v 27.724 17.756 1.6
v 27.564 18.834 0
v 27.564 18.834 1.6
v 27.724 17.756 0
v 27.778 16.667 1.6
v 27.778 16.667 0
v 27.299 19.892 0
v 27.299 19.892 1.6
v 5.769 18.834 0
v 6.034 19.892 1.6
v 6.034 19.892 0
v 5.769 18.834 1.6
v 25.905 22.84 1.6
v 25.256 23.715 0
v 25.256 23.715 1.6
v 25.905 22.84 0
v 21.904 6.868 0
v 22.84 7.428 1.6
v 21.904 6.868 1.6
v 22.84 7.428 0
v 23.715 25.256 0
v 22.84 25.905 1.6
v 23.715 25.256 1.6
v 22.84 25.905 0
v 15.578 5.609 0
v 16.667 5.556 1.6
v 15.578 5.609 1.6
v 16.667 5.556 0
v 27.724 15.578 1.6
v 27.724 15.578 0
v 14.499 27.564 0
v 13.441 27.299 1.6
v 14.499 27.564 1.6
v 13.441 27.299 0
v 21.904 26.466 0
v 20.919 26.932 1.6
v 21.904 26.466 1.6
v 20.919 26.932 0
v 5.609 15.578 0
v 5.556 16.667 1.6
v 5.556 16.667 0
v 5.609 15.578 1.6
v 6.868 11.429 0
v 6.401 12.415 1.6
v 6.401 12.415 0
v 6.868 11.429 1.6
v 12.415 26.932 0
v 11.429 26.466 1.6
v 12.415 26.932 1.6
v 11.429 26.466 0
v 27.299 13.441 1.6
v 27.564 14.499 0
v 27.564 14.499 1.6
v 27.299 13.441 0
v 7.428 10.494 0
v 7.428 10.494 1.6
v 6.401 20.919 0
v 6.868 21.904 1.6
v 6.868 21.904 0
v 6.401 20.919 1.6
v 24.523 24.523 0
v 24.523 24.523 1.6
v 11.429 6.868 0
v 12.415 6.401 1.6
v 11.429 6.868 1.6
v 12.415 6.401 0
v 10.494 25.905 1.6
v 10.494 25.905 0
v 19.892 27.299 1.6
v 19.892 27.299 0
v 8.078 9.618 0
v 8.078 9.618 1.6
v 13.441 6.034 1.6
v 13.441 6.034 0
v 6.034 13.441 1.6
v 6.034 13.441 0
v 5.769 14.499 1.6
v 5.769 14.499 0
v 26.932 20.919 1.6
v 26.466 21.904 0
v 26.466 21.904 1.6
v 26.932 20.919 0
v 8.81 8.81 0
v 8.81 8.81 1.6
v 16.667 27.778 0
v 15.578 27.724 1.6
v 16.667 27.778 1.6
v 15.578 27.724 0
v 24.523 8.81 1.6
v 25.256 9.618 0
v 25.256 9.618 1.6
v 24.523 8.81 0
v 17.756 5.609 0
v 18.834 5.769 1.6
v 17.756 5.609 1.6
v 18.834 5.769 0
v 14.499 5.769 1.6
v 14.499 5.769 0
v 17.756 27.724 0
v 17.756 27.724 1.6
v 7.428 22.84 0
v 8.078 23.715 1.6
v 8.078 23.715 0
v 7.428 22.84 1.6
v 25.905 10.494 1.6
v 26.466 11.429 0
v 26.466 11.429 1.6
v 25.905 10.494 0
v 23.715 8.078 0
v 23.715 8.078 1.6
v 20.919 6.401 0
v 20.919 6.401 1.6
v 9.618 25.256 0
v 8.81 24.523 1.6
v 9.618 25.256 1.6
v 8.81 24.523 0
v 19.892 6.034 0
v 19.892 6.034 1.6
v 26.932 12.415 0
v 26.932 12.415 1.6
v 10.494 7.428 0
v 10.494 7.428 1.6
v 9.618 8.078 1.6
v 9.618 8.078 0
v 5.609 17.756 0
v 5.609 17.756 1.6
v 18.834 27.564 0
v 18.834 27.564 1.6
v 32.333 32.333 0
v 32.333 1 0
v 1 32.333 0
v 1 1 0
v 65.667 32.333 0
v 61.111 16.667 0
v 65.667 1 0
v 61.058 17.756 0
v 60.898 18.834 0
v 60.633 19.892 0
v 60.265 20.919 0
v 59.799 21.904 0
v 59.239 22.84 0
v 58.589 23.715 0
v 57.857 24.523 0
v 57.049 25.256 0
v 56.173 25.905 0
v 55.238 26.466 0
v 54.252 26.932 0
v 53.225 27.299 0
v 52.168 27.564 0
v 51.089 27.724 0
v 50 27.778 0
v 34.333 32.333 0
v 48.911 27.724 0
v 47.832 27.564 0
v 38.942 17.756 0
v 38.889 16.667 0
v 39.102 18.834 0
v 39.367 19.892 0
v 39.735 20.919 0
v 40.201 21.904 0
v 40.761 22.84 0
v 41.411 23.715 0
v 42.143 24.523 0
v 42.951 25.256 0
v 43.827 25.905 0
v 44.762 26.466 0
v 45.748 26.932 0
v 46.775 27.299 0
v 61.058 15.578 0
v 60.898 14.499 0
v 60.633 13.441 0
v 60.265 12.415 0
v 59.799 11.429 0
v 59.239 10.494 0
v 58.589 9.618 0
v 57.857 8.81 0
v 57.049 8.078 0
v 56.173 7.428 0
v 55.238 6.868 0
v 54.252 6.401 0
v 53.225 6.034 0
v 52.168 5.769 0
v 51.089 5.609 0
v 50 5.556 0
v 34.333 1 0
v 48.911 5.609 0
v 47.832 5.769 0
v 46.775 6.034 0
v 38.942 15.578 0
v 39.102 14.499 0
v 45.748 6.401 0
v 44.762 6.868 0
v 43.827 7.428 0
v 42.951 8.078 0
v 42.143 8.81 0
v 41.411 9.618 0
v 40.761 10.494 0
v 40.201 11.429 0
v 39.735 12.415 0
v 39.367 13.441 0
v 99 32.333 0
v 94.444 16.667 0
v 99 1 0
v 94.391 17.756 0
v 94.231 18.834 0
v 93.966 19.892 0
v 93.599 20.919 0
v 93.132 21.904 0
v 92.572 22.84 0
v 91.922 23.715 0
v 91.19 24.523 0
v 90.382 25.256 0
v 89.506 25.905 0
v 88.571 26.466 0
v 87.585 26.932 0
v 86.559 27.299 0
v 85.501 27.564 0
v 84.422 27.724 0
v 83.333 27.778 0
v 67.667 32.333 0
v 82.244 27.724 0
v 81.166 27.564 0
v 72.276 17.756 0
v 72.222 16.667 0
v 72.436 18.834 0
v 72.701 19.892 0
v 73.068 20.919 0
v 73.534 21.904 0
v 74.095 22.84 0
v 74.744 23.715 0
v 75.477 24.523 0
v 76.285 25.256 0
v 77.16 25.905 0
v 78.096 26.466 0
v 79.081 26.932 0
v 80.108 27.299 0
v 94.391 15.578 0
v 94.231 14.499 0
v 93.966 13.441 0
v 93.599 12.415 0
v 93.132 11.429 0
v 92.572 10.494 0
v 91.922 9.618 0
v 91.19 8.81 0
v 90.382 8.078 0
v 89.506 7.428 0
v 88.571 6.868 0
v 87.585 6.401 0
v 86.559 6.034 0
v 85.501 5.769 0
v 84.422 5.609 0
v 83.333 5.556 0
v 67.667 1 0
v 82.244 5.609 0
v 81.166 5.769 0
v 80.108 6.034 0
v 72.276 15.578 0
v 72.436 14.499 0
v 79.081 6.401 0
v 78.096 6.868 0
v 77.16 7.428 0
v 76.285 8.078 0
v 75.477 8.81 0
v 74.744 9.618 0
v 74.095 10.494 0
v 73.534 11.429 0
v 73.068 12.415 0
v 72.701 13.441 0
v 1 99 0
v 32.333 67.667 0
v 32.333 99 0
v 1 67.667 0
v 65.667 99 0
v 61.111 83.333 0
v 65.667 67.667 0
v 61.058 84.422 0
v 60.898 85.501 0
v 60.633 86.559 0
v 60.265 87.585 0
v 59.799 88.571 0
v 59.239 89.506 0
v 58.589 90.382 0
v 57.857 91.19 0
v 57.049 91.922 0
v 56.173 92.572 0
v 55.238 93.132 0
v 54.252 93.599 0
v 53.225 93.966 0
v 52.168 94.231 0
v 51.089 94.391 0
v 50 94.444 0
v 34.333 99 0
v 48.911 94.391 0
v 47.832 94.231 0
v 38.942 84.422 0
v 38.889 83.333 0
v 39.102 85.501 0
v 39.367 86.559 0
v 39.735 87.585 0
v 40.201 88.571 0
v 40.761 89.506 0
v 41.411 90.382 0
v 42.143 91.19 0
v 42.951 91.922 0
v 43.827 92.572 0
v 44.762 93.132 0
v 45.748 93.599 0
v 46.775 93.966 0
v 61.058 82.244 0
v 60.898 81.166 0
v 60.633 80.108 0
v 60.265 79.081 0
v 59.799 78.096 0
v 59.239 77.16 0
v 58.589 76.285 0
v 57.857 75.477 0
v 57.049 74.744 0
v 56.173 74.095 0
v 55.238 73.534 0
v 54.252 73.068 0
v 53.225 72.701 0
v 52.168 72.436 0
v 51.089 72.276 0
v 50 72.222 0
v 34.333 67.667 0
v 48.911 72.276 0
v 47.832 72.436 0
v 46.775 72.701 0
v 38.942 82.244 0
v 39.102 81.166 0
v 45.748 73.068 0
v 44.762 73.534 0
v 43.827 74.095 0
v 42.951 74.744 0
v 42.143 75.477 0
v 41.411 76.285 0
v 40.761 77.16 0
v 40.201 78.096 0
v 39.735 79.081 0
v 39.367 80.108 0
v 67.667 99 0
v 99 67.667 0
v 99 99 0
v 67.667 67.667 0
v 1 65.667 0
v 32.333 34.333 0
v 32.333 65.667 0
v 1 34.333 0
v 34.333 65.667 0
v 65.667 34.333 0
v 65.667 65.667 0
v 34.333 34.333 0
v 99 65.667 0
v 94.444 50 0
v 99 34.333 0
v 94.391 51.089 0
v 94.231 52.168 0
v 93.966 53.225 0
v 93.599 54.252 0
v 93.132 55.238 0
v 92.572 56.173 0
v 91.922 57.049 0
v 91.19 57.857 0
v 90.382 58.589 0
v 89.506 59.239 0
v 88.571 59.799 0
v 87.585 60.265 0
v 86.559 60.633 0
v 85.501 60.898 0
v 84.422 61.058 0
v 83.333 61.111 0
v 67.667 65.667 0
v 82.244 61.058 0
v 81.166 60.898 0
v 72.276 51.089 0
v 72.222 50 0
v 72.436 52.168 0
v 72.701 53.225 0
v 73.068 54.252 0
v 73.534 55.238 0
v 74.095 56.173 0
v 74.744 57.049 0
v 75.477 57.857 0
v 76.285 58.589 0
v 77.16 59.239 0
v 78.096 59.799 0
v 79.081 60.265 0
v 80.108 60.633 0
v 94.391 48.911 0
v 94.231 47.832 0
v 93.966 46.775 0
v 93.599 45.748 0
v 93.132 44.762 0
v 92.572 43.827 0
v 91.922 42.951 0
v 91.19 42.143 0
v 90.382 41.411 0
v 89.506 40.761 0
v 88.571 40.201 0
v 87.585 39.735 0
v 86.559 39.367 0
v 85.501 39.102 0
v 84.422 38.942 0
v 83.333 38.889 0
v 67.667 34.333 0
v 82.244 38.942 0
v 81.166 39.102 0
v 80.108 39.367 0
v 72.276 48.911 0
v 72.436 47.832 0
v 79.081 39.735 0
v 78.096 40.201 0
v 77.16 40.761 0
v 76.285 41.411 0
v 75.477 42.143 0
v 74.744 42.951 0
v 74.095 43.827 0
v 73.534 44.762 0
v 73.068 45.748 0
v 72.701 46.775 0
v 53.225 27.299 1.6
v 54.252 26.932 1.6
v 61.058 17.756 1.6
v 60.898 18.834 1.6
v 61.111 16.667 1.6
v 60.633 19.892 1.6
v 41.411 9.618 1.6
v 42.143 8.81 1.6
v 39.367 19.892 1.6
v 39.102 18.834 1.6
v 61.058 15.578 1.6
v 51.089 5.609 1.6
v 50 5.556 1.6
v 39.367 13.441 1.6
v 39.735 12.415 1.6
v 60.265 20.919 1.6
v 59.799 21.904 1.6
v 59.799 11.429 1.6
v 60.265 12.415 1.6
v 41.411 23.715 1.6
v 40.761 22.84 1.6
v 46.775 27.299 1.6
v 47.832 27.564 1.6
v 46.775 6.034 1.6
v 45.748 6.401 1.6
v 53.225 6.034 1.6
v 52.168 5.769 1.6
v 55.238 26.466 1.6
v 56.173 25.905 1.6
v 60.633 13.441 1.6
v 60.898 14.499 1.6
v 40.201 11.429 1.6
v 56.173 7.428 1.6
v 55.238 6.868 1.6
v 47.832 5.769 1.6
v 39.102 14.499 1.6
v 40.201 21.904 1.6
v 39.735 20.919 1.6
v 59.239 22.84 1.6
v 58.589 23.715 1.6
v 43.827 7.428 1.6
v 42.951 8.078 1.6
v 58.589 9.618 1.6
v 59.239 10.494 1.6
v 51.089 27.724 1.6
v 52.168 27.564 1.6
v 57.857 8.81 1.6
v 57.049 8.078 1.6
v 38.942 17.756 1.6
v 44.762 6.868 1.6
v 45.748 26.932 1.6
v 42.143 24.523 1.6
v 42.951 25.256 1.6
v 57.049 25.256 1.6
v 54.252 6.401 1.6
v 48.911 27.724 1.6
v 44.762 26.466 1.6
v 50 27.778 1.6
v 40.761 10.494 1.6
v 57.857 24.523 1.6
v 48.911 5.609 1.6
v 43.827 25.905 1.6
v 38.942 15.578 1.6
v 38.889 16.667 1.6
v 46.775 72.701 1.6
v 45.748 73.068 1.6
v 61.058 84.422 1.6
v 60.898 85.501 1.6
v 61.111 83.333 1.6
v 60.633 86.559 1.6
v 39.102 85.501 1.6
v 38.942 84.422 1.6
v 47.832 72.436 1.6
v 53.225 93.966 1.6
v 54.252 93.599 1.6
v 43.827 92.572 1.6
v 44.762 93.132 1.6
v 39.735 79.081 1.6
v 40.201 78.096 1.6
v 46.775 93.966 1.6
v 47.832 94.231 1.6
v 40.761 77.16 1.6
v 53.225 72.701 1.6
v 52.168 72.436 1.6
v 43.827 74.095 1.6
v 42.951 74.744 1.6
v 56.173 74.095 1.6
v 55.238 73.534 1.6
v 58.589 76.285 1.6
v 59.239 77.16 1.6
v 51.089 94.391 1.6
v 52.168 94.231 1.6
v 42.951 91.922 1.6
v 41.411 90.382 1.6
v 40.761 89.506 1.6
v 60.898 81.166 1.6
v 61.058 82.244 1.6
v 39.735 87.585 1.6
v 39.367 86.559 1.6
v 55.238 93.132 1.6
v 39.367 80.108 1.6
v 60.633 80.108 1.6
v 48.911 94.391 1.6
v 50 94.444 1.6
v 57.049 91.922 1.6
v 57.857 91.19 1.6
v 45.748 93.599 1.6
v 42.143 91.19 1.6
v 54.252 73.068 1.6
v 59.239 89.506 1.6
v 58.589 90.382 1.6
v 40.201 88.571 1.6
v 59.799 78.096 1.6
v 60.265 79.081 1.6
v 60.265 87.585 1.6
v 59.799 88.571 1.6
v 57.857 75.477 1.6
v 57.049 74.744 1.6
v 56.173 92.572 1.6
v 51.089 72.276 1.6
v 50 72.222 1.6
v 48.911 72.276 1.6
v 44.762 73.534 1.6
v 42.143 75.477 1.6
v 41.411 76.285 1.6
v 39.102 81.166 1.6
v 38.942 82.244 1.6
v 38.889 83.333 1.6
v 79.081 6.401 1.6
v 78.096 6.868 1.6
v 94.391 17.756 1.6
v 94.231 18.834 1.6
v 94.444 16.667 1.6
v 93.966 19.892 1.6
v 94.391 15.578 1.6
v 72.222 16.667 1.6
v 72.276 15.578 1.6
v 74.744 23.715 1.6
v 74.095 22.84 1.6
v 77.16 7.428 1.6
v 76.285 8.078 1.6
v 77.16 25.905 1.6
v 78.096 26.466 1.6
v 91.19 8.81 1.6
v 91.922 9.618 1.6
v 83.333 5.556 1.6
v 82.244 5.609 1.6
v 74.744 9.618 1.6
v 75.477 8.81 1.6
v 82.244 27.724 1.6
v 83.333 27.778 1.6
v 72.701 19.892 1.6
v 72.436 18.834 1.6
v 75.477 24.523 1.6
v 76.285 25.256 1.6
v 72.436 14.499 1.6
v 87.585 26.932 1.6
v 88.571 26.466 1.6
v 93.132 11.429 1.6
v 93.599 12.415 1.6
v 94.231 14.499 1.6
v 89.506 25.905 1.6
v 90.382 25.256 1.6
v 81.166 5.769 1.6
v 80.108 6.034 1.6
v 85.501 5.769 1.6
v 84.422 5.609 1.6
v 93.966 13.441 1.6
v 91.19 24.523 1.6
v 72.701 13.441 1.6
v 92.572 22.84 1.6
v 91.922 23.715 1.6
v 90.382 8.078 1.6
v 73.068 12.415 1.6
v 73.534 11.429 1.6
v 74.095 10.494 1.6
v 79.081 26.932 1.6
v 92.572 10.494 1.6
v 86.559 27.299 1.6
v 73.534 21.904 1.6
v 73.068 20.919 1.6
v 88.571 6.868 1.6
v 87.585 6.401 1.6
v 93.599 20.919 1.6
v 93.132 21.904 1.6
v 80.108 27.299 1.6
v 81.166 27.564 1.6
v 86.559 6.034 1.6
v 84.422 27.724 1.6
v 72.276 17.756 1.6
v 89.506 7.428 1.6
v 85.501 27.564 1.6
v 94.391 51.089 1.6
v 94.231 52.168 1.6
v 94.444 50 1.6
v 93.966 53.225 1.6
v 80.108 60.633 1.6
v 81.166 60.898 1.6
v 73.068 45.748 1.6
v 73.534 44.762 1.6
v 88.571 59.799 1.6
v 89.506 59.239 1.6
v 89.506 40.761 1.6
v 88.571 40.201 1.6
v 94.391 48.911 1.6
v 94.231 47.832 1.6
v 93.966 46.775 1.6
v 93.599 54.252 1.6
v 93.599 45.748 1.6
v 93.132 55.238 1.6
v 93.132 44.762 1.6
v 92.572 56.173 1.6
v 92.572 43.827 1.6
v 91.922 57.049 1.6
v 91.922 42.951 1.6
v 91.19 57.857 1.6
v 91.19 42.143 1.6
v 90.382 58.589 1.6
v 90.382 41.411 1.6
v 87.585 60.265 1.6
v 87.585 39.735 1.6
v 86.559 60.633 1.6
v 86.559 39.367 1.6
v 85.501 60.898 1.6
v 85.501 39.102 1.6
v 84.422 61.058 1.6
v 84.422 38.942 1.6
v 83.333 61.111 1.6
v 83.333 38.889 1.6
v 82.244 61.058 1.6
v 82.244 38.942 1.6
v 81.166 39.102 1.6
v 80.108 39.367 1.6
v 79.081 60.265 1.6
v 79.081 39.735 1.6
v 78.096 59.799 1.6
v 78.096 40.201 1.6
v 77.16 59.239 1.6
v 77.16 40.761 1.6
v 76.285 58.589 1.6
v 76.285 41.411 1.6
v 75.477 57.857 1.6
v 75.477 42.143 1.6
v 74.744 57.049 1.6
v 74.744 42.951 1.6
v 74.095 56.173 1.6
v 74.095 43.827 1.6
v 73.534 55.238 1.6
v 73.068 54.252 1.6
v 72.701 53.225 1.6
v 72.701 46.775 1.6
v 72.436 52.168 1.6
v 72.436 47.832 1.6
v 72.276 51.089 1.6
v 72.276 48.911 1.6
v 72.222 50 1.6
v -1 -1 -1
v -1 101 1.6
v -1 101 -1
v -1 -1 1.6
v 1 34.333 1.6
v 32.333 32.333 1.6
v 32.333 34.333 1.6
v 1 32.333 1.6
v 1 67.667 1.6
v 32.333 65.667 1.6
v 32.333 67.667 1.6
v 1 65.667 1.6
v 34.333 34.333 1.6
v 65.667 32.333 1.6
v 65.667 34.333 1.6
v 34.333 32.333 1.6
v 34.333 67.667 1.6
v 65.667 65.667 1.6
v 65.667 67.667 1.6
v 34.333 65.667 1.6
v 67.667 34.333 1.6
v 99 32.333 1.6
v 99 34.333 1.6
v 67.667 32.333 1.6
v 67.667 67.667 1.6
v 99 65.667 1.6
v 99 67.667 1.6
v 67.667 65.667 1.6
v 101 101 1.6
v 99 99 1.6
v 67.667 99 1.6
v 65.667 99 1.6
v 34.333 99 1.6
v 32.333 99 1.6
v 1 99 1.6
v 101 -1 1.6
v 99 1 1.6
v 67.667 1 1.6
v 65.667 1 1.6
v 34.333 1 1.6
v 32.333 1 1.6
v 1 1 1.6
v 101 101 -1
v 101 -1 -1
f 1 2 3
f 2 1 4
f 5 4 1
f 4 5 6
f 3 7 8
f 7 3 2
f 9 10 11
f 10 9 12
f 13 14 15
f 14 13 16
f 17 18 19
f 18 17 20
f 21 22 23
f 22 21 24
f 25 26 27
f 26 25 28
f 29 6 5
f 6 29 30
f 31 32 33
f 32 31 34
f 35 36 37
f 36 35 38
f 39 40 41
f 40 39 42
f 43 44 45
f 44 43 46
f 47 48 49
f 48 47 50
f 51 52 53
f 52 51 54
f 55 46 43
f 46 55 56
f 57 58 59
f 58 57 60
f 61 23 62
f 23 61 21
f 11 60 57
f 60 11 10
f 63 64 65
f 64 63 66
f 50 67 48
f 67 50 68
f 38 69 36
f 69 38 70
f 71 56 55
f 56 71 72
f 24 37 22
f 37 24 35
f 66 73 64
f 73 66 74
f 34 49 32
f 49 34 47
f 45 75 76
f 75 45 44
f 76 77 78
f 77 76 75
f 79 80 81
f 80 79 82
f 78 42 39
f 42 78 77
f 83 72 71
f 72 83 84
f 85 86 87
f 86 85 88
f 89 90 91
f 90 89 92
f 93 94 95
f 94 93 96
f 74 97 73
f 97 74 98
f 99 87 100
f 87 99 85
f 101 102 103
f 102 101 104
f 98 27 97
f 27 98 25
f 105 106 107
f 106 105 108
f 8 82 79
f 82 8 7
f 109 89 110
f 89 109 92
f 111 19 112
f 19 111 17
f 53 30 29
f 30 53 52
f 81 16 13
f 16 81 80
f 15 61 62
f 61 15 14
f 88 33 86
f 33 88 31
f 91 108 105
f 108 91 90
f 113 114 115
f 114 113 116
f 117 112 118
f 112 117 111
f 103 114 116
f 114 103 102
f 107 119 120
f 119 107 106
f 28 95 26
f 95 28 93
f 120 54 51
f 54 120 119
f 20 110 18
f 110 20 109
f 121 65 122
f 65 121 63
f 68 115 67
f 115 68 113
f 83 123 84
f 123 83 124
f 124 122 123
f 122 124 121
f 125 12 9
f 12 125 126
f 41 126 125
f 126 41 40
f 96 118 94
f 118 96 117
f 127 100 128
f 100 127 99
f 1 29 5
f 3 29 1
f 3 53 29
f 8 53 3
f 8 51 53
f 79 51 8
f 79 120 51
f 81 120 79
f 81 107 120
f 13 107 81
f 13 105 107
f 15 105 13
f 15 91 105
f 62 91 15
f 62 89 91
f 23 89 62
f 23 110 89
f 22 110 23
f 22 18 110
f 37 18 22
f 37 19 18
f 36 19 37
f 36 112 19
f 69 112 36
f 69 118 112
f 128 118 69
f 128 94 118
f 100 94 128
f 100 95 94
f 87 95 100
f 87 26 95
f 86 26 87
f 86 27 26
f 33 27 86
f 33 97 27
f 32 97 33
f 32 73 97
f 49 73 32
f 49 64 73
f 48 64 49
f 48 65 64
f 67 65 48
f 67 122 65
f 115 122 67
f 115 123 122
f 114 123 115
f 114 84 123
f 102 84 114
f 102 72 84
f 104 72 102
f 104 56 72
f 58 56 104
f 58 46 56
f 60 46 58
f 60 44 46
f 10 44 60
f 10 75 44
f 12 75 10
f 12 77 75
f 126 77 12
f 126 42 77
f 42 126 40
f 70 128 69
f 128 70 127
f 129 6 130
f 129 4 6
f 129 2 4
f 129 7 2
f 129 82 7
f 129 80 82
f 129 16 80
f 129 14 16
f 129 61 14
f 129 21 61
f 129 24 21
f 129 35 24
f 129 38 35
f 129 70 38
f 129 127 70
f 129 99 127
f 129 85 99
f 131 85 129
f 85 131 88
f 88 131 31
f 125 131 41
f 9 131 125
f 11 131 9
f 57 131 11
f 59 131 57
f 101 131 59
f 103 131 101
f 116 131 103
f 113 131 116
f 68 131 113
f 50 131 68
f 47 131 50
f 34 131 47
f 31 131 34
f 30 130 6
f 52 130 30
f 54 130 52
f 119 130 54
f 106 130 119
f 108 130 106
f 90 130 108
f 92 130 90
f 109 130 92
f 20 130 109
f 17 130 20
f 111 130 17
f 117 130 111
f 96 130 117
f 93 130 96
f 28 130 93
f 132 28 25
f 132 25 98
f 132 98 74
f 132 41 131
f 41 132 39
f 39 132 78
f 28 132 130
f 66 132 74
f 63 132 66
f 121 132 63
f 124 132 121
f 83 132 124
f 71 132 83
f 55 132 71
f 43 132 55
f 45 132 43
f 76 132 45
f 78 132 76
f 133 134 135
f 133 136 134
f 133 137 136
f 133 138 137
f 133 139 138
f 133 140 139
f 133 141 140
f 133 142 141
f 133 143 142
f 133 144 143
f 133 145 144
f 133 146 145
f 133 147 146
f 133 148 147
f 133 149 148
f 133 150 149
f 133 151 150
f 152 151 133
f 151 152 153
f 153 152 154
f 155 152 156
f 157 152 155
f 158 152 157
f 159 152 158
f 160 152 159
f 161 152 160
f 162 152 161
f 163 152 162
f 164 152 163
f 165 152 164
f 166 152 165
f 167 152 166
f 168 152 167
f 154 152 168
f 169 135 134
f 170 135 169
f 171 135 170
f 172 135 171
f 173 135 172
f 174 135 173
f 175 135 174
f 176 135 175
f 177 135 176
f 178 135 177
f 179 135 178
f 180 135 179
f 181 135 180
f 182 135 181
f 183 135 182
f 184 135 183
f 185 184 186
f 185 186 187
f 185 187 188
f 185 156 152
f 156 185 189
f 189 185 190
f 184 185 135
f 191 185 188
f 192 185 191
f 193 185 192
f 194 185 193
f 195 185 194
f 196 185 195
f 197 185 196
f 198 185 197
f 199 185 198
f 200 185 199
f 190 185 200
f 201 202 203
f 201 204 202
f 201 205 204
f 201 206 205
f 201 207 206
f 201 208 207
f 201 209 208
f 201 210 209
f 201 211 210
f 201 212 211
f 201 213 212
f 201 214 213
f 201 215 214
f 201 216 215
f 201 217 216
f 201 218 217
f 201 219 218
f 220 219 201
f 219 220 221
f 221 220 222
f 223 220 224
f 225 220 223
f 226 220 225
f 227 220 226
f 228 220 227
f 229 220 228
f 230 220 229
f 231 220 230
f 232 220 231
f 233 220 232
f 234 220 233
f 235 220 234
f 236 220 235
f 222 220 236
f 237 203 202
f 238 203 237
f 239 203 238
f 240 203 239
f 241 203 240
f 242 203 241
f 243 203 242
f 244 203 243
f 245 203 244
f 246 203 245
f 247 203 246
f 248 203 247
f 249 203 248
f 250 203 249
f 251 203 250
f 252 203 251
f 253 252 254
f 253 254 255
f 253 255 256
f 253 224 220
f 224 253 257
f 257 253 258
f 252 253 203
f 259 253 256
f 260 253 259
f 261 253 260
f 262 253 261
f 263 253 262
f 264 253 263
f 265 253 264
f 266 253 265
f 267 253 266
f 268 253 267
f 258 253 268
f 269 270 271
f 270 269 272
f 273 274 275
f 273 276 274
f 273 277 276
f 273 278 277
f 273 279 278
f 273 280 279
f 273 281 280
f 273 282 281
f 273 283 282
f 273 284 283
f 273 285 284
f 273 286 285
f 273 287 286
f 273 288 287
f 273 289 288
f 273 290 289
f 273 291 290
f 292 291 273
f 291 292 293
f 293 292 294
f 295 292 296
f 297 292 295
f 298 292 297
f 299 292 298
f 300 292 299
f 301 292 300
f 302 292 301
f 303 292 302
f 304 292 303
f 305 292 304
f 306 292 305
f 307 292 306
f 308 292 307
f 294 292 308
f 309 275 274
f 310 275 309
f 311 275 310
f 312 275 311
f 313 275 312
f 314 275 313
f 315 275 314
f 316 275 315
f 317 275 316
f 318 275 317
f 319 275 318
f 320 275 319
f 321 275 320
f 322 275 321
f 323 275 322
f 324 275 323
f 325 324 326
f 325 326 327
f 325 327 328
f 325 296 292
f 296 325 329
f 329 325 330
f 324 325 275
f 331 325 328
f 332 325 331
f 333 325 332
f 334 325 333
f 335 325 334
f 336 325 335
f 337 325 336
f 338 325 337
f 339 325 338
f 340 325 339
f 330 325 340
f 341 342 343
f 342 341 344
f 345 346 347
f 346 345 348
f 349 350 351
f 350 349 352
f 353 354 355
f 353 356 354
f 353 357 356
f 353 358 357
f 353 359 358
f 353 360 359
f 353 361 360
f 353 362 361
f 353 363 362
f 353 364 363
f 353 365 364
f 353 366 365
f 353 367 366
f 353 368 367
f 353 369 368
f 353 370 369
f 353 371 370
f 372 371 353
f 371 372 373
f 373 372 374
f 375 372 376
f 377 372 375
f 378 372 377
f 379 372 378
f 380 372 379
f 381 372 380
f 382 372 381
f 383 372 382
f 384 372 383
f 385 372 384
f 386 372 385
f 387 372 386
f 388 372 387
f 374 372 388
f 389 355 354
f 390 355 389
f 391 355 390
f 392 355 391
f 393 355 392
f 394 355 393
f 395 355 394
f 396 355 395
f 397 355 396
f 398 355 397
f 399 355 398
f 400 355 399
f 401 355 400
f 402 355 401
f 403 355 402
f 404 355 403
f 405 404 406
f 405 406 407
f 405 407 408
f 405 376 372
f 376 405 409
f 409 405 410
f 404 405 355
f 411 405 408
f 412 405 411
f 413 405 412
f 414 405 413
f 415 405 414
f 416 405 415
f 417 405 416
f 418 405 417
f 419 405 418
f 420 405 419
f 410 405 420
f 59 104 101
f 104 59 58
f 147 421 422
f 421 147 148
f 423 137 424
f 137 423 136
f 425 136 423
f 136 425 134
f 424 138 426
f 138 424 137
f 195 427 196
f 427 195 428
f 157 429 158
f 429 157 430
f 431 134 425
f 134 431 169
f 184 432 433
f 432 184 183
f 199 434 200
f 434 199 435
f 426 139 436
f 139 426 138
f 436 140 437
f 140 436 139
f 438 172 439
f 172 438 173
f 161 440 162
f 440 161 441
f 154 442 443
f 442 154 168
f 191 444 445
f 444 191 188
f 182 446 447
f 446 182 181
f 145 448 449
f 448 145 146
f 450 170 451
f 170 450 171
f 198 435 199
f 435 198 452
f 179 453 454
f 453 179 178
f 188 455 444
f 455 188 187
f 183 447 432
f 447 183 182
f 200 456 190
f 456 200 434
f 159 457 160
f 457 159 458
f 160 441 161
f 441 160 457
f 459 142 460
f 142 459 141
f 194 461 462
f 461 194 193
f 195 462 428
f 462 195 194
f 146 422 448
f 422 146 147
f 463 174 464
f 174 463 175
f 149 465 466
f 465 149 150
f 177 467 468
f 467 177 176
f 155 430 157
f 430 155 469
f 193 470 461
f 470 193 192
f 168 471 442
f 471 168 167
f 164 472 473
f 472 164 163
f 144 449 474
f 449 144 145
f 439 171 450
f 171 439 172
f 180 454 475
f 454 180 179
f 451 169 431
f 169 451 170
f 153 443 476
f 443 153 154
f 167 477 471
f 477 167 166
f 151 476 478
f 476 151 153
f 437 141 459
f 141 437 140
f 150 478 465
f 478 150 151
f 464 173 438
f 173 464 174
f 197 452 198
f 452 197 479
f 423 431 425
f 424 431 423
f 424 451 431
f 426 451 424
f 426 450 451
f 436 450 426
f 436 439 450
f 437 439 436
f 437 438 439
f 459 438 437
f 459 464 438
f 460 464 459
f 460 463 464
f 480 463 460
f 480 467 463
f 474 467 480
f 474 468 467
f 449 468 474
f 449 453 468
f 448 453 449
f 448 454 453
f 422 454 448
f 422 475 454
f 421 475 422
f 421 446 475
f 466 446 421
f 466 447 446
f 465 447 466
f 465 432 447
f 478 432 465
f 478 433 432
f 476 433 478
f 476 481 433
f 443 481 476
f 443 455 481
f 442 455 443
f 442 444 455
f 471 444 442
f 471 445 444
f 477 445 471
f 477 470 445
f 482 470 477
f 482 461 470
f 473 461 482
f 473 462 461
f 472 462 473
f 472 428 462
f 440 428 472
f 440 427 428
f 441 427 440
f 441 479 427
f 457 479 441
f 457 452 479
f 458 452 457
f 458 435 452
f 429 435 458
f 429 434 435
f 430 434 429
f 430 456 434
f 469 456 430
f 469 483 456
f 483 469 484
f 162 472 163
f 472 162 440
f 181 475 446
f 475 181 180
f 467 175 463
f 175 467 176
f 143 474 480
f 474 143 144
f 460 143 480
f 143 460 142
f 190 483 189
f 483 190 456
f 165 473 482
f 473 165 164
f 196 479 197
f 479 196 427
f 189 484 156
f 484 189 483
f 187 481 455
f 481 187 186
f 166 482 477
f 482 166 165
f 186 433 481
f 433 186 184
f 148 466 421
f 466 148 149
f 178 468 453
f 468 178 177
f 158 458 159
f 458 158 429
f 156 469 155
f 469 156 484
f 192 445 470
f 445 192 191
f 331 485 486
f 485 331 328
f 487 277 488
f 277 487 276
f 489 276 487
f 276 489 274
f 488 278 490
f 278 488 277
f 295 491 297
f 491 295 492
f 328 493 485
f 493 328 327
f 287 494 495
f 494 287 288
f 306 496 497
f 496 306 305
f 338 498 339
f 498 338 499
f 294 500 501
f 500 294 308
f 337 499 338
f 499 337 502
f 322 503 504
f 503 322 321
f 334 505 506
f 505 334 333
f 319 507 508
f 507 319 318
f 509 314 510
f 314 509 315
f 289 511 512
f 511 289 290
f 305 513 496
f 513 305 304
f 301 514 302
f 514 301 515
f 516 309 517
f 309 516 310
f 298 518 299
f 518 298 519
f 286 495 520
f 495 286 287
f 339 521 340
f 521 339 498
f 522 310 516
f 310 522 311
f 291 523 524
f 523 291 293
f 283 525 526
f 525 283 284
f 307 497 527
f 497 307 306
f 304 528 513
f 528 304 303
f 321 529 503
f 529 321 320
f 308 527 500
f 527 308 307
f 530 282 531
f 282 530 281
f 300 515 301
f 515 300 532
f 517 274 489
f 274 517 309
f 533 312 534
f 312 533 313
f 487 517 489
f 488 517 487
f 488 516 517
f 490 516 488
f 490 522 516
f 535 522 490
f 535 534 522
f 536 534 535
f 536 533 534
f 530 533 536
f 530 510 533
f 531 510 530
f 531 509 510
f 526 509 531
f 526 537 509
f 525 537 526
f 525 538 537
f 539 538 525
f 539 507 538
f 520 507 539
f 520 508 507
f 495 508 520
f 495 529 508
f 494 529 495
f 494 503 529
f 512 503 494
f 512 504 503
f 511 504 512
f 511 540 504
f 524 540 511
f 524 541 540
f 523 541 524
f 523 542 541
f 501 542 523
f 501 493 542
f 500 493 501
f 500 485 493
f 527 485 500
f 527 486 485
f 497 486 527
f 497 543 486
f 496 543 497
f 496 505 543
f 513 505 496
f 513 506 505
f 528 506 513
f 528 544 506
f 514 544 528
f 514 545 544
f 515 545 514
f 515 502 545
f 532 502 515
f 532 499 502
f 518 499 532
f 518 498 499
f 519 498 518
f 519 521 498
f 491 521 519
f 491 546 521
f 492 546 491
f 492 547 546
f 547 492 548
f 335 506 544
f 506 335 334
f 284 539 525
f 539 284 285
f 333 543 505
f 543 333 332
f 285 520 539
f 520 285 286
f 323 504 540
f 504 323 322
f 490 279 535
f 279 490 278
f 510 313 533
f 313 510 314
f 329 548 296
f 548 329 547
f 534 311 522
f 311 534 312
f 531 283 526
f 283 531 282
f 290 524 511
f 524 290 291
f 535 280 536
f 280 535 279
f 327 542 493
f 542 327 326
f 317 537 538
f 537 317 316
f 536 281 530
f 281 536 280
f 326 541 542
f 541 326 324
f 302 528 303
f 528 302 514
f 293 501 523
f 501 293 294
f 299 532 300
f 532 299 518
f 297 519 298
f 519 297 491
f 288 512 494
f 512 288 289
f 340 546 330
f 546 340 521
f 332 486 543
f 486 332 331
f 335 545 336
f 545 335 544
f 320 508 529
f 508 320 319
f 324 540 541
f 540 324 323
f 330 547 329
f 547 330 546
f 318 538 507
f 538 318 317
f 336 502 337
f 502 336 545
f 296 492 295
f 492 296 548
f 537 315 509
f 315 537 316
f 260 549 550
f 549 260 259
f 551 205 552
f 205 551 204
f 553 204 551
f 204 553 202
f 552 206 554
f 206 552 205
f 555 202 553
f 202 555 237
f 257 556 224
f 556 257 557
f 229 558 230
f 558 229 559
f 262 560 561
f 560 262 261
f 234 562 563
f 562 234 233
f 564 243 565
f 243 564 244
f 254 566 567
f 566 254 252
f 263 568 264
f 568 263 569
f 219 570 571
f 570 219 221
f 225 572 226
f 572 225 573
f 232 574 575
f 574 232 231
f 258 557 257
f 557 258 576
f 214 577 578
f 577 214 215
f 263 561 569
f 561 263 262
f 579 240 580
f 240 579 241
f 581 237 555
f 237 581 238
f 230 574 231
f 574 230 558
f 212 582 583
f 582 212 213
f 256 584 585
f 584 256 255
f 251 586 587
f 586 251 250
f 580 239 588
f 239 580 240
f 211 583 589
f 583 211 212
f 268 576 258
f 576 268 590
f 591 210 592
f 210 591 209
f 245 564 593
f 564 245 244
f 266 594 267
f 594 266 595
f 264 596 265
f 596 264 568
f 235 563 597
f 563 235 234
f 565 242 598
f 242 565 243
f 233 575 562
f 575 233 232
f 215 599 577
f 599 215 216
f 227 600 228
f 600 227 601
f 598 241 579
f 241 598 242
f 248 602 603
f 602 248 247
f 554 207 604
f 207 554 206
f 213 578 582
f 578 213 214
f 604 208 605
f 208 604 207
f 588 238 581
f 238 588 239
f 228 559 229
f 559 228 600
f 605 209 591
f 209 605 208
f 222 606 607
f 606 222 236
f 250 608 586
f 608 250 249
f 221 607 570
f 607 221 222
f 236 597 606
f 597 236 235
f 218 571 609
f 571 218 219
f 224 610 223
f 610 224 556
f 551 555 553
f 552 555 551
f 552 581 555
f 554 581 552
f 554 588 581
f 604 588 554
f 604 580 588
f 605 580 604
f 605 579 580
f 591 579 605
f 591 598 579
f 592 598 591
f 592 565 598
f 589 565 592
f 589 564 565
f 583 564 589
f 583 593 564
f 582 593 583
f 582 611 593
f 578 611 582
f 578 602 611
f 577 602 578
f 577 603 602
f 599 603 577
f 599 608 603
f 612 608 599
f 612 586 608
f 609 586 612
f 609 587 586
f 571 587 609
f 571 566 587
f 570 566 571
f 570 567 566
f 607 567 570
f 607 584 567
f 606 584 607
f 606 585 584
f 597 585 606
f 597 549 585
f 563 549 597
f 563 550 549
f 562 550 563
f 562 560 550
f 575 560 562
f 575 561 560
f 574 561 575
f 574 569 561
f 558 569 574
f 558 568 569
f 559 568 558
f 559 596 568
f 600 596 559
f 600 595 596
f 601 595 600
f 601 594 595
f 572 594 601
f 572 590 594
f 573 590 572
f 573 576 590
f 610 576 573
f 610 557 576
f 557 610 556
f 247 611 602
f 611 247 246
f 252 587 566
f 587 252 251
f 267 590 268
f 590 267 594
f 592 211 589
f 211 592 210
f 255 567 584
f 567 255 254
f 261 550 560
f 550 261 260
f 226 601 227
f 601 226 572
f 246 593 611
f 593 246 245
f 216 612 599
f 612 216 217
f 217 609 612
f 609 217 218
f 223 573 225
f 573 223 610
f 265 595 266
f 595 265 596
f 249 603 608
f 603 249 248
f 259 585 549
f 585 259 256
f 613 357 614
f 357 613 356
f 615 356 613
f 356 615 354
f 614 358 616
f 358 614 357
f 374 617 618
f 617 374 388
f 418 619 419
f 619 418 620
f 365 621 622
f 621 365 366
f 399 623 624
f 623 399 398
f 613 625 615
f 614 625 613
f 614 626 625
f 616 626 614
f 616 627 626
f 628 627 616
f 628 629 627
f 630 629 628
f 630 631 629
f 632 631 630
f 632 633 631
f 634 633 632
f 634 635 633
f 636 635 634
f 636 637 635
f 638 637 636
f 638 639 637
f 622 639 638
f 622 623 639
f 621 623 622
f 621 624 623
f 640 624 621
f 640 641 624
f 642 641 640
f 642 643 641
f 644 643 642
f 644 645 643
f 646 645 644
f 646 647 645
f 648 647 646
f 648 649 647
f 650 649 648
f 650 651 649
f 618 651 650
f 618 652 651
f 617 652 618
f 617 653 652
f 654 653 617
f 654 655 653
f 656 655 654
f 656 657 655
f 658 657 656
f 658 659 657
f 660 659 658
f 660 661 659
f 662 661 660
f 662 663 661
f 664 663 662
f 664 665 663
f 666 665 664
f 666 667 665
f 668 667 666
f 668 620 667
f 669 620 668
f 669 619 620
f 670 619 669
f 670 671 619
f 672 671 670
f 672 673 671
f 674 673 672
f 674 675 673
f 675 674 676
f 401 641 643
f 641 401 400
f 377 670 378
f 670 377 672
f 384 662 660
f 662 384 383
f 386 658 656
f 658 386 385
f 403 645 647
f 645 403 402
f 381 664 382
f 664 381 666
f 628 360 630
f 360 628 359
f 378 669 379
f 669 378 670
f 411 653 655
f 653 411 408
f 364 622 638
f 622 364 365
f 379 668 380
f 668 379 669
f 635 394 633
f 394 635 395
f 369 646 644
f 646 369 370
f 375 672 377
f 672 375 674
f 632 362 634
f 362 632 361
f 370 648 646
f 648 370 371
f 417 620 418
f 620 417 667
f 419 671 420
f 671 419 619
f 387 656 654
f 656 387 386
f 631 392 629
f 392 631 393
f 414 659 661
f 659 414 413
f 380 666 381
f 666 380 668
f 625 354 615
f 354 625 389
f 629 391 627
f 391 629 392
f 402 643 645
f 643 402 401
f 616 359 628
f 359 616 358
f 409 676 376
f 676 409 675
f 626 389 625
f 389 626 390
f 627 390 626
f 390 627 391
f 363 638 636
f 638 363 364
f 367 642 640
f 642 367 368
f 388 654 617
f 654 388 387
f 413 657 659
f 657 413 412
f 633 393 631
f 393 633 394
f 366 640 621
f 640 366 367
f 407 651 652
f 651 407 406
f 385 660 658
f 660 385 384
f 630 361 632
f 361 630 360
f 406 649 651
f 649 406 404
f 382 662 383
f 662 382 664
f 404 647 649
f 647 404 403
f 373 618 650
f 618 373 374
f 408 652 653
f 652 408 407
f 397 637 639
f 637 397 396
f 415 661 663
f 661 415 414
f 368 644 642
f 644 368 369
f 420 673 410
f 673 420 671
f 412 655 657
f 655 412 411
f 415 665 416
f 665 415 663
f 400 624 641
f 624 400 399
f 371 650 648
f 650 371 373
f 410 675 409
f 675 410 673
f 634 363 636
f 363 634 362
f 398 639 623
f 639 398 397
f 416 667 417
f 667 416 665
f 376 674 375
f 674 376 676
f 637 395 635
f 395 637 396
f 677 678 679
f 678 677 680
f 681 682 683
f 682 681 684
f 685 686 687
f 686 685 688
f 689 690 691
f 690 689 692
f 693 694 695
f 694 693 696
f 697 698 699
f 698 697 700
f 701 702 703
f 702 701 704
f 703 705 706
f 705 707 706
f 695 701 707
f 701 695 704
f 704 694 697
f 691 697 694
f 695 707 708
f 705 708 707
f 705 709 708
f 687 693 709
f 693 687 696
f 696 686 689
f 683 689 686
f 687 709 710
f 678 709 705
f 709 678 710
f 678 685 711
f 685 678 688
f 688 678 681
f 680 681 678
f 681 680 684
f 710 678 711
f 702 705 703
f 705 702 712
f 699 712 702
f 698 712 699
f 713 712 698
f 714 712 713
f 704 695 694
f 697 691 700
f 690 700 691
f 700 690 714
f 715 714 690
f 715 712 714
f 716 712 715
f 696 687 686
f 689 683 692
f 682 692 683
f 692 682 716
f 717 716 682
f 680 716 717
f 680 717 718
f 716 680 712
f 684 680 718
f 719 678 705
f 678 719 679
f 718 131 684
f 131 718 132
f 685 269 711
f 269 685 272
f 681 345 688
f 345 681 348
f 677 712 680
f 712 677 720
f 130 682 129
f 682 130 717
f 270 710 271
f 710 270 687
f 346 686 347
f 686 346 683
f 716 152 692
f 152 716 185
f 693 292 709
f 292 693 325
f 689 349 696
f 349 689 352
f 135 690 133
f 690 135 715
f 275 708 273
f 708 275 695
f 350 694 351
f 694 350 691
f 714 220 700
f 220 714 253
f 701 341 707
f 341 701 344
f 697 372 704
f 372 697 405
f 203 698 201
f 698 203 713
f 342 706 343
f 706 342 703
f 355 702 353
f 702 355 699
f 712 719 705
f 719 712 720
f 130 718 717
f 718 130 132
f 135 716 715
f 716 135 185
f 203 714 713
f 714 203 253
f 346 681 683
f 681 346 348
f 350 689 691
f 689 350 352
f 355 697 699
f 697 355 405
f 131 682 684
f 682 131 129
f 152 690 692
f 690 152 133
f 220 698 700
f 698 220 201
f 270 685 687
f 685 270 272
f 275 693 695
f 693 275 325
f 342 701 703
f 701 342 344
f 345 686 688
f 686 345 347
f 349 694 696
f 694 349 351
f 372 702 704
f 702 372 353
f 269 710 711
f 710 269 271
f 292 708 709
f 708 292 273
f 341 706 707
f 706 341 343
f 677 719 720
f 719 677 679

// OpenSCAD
line_width = 2;
figure_width = 100;
figure_thickness = 1;
logo_layout = [
    [true, false, false],
    [true, false, true],
    [true, true, false]
];
logo_height = 1.6;

segment_width = figure_width / 3;

$fn=64;

module line(w, h, a, b) {
    linear_extrude(h) hull() {
        translate(a) square(w, center=true);
        translate(b) square(w, center=true);
    }
}

function translate_circle(x, y) = [segment_width*x+segment_width/2, segment_width*y+segment_width/2];

union() {
    translate([-line_width/2, -line_width/2, -figure_thickness]) cube([figure_width+line_width, figure_width+line_width, figure_thickness]);
    for(x=[0:2], y=[0:2]) {
        if(logo_layout[x][y]) {
            translate(translate_circle(x, y)) cylinder(h=logo_height, r=segment_width/3);
        }
    }
    //vertical lines
    for (x=[0:3]) {
        line(line_width, logo_height, [segment_width*x, 0], [segment_width*x, figure_width]);
    }
    //horizontal lines
    for (y=[0:3]) {
        line(line_width, logo_height, [0, segment_width*y], [figure_width, segment_width*y]);
    }
}
